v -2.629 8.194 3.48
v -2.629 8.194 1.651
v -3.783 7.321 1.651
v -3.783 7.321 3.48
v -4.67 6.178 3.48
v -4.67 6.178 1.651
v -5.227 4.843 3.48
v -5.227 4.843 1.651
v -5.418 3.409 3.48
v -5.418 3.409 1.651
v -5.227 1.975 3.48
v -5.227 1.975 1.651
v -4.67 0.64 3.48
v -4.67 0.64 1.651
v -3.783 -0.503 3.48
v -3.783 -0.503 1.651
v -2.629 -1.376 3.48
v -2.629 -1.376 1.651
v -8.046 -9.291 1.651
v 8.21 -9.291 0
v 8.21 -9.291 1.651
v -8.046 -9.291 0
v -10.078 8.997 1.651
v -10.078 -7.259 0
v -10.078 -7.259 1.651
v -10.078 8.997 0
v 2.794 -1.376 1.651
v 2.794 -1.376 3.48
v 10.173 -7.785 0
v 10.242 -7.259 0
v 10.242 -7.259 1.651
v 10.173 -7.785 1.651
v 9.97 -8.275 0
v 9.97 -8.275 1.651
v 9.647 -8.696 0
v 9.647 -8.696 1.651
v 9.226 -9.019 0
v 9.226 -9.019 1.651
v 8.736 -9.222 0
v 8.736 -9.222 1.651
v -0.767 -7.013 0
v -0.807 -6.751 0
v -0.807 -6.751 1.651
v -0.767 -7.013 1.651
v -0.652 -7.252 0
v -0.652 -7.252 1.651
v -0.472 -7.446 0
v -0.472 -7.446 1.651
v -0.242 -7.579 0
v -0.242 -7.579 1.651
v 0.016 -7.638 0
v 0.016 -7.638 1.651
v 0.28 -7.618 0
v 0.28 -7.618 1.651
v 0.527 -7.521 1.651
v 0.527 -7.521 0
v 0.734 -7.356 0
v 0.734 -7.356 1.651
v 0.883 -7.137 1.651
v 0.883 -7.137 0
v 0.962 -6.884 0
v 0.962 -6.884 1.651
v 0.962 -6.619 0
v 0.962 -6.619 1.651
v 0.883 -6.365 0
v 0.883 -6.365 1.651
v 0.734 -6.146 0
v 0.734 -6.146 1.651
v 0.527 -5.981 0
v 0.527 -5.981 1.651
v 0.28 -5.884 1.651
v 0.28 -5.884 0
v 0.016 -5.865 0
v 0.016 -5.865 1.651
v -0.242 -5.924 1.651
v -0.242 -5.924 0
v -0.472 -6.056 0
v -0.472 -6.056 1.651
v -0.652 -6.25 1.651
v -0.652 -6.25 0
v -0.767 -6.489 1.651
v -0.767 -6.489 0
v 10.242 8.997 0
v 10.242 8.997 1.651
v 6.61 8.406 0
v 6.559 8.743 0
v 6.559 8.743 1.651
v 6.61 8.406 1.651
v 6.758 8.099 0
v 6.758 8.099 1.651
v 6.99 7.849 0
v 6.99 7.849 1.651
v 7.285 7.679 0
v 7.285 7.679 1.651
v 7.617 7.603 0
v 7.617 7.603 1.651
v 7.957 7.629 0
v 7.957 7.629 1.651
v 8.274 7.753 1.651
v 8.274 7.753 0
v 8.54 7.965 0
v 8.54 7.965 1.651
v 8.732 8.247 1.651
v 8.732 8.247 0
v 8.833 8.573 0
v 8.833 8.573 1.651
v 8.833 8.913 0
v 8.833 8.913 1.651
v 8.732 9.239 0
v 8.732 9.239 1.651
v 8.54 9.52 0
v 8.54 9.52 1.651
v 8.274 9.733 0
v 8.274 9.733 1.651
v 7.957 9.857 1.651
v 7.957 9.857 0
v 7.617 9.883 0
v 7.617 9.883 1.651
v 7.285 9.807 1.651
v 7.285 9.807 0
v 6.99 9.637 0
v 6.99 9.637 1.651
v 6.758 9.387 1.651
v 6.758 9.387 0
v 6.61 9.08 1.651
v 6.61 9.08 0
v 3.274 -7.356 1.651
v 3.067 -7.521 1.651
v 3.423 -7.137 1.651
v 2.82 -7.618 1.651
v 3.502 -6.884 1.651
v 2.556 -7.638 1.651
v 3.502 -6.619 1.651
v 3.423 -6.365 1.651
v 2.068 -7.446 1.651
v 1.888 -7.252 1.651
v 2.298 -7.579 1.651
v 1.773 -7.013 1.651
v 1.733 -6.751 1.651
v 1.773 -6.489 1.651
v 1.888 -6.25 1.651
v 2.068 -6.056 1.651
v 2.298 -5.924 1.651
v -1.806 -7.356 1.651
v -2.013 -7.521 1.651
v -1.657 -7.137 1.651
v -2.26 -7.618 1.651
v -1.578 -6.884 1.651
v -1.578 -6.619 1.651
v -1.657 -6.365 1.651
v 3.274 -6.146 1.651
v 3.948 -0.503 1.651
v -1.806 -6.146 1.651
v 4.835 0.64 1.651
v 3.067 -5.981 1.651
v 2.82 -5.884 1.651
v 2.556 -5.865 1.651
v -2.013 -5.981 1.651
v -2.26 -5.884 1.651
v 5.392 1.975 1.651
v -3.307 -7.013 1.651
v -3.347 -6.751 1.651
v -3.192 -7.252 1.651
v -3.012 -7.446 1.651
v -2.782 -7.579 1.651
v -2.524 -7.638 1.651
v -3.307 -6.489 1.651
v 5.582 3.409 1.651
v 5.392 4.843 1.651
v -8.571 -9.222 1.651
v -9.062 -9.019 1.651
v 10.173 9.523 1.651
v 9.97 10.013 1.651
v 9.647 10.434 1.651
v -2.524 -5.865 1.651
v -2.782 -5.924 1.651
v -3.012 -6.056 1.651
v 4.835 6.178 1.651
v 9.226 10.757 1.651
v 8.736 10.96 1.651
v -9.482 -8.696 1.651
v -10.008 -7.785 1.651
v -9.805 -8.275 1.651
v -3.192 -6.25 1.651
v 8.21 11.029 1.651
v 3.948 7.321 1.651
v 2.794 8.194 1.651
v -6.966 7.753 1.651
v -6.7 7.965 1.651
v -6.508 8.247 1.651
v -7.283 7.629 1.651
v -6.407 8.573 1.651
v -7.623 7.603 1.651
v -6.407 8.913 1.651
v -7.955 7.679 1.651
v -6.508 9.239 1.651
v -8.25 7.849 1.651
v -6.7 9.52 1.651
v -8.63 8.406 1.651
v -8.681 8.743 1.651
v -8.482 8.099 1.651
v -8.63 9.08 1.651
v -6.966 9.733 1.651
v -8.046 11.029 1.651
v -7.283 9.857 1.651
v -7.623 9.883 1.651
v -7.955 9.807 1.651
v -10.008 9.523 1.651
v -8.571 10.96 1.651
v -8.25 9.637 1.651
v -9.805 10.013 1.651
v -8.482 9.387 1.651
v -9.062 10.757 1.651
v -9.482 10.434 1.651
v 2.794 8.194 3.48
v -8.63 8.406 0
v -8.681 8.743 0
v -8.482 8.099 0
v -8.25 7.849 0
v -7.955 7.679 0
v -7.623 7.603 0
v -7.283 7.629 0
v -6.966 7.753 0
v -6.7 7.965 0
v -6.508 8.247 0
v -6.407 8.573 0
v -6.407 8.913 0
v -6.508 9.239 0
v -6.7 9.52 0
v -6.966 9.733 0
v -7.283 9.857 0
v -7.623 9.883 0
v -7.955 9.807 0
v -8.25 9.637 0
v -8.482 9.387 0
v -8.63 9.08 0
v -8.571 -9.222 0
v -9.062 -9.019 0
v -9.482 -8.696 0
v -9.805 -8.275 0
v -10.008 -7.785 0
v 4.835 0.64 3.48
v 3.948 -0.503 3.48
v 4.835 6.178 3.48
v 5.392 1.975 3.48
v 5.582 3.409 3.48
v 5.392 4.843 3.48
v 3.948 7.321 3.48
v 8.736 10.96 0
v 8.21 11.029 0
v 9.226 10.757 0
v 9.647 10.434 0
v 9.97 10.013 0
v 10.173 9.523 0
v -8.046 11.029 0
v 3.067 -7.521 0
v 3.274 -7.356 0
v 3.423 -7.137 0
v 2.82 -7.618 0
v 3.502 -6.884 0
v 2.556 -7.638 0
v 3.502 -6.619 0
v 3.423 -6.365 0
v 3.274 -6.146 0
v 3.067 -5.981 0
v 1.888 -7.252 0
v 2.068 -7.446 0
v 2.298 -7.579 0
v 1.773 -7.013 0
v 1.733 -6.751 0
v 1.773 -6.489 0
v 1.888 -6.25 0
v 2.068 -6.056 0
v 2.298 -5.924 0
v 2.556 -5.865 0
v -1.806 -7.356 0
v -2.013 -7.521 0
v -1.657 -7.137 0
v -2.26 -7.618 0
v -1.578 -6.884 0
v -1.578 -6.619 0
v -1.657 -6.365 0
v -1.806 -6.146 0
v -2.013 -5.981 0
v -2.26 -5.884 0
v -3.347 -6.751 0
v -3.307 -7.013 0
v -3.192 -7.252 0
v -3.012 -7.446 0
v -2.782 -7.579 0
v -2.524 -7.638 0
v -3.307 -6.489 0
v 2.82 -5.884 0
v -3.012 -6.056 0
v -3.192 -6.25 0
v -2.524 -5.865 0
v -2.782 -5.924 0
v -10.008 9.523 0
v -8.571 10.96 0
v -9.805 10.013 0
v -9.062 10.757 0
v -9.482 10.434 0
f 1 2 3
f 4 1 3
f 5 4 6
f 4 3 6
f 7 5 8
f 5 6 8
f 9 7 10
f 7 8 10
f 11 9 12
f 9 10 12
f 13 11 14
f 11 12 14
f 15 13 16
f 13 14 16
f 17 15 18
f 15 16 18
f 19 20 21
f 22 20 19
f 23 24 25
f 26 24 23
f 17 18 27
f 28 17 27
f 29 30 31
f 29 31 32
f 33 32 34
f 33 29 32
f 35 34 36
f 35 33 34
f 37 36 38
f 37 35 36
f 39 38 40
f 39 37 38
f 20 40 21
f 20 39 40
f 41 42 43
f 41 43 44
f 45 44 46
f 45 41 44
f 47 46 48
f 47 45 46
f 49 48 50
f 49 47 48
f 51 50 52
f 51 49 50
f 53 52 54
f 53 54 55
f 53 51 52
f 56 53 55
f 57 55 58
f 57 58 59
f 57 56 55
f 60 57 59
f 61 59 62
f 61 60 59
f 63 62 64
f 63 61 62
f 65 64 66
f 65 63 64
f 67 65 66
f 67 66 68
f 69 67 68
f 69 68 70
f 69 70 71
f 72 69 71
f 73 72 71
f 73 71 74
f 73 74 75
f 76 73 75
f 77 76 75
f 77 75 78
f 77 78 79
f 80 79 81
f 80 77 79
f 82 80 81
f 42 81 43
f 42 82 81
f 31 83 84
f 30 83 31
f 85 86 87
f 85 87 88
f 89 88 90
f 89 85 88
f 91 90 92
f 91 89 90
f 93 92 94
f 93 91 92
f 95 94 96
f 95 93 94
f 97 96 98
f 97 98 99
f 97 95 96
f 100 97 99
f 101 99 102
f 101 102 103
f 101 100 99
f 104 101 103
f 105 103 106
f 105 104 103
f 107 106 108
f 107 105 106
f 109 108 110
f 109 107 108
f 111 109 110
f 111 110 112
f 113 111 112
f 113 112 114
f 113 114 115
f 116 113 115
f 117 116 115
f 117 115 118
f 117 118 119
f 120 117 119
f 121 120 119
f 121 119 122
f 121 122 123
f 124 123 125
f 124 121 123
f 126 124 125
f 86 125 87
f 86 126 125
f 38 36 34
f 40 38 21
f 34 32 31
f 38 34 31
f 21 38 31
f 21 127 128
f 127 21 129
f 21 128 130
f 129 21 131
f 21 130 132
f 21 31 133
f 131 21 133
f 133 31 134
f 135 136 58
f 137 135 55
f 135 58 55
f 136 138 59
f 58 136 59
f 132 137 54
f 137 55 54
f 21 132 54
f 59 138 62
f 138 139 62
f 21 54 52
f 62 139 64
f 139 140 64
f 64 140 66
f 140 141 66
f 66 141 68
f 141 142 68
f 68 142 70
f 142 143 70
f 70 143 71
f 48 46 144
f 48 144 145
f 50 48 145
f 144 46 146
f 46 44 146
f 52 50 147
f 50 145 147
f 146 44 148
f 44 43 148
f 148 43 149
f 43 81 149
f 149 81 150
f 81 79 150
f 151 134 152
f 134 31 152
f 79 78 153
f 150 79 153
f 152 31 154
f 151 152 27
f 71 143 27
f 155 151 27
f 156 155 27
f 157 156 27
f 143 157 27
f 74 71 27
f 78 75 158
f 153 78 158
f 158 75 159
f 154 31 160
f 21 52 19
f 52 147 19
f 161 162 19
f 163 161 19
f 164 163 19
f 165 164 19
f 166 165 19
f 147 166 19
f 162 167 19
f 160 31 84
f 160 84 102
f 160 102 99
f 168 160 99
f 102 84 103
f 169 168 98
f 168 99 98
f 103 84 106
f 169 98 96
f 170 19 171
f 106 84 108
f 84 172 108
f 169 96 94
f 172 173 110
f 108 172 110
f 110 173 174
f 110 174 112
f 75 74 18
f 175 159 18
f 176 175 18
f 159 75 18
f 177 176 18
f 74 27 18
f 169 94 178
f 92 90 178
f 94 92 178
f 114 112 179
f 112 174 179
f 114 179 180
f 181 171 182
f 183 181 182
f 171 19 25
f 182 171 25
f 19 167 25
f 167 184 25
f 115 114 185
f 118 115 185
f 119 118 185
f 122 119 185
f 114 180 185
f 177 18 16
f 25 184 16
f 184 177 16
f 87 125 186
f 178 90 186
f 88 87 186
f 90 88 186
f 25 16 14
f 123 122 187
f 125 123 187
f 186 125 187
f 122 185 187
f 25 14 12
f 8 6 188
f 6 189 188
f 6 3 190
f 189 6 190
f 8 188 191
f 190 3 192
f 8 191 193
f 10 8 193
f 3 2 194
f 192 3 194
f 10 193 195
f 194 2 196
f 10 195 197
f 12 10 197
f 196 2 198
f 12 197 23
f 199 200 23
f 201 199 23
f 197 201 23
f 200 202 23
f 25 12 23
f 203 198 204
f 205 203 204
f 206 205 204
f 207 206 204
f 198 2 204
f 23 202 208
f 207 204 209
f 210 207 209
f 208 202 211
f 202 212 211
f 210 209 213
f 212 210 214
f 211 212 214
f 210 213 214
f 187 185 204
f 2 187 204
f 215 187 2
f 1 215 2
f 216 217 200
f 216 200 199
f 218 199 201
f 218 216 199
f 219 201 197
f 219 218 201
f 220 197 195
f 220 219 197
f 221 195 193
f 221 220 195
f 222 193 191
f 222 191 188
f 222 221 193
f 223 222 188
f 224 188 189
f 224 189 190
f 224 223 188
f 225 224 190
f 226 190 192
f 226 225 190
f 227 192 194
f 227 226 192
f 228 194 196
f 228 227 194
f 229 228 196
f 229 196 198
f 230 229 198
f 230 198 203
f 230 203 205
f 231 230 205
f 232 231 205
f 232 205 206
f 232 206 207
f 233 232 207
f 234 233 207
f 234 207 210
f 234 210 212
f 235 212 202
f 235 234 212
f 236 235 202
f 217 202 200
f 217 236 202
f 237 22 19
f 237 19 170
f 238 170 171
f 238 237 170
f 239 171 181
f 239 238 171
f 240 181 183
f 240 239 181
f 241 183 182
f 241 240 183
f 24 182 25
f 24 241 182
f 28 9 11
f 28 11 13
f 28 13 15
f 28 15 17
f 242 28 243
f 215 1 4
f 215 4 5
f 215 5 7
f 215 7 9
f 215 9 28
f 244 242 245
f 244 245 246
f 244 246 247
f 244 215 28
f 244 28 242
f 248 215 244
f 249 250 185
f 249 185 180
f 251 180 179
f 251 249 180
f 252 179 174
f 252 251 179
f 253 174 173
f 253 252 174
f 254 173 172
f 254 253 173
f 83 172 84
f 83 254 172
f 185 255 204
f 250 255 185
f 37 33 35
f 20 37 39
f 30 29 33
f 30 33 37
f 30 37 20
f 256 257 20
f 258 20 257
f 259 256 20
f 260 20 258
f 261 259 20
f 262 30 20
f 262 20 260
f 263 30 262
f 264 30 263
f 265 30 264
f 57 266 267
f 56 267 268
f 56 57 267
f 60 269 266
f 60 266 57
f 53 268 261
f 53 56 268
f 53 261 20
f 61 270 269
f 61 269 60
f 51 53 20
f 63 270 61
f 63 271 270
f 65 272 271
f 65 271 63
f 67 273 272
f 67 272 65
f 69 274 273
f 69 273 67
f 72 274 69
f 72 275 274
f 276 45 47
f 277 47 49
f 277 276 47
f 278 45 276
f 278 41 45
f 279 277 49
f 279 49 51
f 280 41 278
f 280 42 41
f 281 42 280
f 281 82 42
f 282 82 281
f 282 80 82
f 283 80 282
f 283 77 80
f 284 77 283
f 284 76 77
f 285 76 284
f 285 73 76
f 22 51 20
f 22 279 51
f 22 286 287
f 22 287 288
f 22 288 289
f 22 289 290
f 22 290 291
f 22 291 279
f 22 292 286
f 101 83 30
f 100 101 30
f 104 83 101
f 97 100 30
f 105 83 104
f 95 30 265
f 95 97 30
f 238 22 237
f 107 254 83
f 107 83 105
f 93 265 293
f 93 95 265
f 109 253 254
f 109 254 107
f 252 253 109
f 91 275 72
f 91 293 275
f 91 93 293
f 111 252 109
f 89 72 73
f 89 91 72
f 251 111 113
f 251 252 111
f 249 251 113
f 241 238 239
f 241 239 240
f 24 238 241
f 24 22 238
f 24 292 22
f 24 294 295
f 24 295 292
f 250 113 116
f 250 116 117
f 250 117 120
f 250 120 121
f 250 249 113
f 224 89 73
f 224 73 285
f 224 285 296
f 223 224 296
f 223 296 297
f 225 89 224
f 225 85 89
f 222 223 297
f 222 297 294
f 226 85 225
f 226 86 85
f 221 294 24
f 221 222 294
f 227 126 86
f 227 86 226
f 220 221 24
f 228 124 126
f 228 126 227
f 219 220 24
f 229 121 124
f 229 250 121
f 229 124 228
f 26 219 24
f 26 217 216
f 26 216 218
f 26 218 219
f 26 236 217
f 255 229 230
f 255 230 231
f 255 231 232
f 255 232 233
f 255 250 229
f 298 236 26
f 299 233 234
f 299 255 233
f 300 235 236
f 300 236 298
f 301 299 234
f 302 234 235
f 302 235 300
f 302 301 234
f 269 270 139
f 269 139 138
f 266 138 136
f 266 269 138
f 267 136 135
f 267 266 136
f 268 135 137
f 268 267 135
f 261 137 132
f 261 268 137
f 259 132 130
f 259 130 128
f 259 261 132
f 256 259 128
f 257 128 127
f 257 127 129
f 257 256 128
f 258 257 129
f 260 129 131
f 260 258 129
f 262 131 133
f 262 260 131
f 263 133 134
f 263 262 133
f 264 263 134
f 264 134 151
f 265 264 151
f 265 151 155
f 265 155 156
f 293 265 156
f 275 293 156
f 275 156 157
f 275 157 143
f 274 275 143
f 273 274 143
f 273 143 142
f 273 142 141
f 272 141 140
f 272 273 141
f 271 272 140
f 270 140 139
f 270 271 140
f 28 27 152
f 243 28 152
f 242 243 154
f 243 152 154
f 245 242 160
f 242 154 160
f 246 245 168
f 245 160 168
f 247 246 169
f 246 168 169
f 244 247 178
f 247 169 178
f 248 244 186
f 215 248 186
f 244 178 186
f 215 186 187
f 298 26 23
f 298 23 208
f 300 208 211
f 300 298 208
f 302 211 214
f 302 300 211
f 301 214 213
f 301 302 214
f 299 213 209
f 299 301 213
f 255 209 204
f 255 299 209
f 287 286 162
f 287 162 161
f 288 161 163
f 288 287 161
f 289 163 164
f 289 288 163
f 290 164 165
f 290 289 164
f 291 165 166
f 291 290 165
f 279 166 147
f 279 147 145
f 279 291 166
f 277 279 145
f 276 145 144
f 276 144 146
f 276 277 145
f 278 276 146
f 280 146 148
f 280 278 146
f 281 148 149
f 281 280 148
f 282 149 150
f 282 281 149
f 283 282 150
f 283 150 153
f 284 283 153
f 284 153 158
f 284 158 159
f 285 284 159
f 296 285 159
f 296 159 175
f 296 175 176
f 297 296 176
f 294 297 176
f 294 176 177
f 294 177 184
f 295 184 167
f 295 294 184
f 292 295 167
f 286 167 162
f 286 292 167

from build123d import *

# Parameters (mm, degrees)
SKETCH1_R           = 1.143
SKETCH1_R_2         = 0.889
BOSS_EXTRUDE1_DEPTH = 1.651
BOSS_EXTRUDE2_DEPTH = 1.8288


with BuildPart() as part:
    # Sketch1 → Boss-Extrude1 (new body)
    with BuildSketch(Plane.XY):
        with BuildLine():
            Line((-8.04553404, 11.028906935), (8.21046596, 11.028906935))
            ThreePointArc((8.21046596, 11.028906935), (9.647306939, 10.433747914), (10.24246596, 8.996906935))
            Line((10.24246596, 8.996906935), (10.24246596, -7.259093065))
            ThreePointArc((10.24246596, -7.259093065), (9.647306939, -8.695934044), (8.21046596, -9.291093065))
            Line((8.21046596, -9.291093065), (-8.04553404, -9.291093065))
            ThreePointArc((-8.04553404, -9.291093065), (-9.48237502, -8.695934044), (-10.07753404, -7.259093065))
            Line((-10.07753404, -7.259093065), (-10.07753404, 8.996906935))
            ThreePointArc((-10.07753404, 8.996906935), (-9.48237502, 10.433747914), (-8.04553404, 11.028906935))
        make_face()
        with Locations(Location((-7.53753404, 8.742906935, 0), (0, 0, 180))):
            Circle(SKETCH1_R, mode=Mode.SUBTRACT)
        with Locations(Location((7.70246596, 8.742906935, 0), (0, 0, 180))):
            Circle(SKETCH1_R, mode=Mode.SUBTRACT)
        with Locations(Location((0.08246596, -6.751093065, 0), (0, 0, 180))):
            Circle(SKETCH1_R_2, mode=Mode.SUBTRACT)
        with Locations(Location((2.62246596, -6.751093065, 0), (0, 0, 180))):
            Circle(SKETCH1_R_2, mode=Mode.SUBTRACT)
        with Locations(Location((-2.45753404, -6.751093065, 0), (0, 0, 180))):
            Circle(SKETCH1_R_2, mode=Mode.SUBTRACT)
    extrude(amount=BOSS_EXTRUDE1_DEPTH)

    # Sketch2 → Boss-Extrude2 (add)
    with BuildSketch(Plane.XY.offset(1.651)):
        with BuildLine():
            Line((2.794250427, 8.193906935), (-2.629318508, 8.193906935))
            ThreePointArc((-2.629318508, 8.193906935), (-5.41753404, 3.408906935), (-2.629318508, -1.376093065))
            Line((-2.629318508, -1.376093065), (2.794250427, -1.376093065))
            ThreePointArc((2.794250427, -1.376093065), (5.58246596, 3.408906935), (2.794250427, 8.193906935))
        make_face()
    extrude(amount=BOSS_EXTRUDE2_DEPTH)


solid = part.part
